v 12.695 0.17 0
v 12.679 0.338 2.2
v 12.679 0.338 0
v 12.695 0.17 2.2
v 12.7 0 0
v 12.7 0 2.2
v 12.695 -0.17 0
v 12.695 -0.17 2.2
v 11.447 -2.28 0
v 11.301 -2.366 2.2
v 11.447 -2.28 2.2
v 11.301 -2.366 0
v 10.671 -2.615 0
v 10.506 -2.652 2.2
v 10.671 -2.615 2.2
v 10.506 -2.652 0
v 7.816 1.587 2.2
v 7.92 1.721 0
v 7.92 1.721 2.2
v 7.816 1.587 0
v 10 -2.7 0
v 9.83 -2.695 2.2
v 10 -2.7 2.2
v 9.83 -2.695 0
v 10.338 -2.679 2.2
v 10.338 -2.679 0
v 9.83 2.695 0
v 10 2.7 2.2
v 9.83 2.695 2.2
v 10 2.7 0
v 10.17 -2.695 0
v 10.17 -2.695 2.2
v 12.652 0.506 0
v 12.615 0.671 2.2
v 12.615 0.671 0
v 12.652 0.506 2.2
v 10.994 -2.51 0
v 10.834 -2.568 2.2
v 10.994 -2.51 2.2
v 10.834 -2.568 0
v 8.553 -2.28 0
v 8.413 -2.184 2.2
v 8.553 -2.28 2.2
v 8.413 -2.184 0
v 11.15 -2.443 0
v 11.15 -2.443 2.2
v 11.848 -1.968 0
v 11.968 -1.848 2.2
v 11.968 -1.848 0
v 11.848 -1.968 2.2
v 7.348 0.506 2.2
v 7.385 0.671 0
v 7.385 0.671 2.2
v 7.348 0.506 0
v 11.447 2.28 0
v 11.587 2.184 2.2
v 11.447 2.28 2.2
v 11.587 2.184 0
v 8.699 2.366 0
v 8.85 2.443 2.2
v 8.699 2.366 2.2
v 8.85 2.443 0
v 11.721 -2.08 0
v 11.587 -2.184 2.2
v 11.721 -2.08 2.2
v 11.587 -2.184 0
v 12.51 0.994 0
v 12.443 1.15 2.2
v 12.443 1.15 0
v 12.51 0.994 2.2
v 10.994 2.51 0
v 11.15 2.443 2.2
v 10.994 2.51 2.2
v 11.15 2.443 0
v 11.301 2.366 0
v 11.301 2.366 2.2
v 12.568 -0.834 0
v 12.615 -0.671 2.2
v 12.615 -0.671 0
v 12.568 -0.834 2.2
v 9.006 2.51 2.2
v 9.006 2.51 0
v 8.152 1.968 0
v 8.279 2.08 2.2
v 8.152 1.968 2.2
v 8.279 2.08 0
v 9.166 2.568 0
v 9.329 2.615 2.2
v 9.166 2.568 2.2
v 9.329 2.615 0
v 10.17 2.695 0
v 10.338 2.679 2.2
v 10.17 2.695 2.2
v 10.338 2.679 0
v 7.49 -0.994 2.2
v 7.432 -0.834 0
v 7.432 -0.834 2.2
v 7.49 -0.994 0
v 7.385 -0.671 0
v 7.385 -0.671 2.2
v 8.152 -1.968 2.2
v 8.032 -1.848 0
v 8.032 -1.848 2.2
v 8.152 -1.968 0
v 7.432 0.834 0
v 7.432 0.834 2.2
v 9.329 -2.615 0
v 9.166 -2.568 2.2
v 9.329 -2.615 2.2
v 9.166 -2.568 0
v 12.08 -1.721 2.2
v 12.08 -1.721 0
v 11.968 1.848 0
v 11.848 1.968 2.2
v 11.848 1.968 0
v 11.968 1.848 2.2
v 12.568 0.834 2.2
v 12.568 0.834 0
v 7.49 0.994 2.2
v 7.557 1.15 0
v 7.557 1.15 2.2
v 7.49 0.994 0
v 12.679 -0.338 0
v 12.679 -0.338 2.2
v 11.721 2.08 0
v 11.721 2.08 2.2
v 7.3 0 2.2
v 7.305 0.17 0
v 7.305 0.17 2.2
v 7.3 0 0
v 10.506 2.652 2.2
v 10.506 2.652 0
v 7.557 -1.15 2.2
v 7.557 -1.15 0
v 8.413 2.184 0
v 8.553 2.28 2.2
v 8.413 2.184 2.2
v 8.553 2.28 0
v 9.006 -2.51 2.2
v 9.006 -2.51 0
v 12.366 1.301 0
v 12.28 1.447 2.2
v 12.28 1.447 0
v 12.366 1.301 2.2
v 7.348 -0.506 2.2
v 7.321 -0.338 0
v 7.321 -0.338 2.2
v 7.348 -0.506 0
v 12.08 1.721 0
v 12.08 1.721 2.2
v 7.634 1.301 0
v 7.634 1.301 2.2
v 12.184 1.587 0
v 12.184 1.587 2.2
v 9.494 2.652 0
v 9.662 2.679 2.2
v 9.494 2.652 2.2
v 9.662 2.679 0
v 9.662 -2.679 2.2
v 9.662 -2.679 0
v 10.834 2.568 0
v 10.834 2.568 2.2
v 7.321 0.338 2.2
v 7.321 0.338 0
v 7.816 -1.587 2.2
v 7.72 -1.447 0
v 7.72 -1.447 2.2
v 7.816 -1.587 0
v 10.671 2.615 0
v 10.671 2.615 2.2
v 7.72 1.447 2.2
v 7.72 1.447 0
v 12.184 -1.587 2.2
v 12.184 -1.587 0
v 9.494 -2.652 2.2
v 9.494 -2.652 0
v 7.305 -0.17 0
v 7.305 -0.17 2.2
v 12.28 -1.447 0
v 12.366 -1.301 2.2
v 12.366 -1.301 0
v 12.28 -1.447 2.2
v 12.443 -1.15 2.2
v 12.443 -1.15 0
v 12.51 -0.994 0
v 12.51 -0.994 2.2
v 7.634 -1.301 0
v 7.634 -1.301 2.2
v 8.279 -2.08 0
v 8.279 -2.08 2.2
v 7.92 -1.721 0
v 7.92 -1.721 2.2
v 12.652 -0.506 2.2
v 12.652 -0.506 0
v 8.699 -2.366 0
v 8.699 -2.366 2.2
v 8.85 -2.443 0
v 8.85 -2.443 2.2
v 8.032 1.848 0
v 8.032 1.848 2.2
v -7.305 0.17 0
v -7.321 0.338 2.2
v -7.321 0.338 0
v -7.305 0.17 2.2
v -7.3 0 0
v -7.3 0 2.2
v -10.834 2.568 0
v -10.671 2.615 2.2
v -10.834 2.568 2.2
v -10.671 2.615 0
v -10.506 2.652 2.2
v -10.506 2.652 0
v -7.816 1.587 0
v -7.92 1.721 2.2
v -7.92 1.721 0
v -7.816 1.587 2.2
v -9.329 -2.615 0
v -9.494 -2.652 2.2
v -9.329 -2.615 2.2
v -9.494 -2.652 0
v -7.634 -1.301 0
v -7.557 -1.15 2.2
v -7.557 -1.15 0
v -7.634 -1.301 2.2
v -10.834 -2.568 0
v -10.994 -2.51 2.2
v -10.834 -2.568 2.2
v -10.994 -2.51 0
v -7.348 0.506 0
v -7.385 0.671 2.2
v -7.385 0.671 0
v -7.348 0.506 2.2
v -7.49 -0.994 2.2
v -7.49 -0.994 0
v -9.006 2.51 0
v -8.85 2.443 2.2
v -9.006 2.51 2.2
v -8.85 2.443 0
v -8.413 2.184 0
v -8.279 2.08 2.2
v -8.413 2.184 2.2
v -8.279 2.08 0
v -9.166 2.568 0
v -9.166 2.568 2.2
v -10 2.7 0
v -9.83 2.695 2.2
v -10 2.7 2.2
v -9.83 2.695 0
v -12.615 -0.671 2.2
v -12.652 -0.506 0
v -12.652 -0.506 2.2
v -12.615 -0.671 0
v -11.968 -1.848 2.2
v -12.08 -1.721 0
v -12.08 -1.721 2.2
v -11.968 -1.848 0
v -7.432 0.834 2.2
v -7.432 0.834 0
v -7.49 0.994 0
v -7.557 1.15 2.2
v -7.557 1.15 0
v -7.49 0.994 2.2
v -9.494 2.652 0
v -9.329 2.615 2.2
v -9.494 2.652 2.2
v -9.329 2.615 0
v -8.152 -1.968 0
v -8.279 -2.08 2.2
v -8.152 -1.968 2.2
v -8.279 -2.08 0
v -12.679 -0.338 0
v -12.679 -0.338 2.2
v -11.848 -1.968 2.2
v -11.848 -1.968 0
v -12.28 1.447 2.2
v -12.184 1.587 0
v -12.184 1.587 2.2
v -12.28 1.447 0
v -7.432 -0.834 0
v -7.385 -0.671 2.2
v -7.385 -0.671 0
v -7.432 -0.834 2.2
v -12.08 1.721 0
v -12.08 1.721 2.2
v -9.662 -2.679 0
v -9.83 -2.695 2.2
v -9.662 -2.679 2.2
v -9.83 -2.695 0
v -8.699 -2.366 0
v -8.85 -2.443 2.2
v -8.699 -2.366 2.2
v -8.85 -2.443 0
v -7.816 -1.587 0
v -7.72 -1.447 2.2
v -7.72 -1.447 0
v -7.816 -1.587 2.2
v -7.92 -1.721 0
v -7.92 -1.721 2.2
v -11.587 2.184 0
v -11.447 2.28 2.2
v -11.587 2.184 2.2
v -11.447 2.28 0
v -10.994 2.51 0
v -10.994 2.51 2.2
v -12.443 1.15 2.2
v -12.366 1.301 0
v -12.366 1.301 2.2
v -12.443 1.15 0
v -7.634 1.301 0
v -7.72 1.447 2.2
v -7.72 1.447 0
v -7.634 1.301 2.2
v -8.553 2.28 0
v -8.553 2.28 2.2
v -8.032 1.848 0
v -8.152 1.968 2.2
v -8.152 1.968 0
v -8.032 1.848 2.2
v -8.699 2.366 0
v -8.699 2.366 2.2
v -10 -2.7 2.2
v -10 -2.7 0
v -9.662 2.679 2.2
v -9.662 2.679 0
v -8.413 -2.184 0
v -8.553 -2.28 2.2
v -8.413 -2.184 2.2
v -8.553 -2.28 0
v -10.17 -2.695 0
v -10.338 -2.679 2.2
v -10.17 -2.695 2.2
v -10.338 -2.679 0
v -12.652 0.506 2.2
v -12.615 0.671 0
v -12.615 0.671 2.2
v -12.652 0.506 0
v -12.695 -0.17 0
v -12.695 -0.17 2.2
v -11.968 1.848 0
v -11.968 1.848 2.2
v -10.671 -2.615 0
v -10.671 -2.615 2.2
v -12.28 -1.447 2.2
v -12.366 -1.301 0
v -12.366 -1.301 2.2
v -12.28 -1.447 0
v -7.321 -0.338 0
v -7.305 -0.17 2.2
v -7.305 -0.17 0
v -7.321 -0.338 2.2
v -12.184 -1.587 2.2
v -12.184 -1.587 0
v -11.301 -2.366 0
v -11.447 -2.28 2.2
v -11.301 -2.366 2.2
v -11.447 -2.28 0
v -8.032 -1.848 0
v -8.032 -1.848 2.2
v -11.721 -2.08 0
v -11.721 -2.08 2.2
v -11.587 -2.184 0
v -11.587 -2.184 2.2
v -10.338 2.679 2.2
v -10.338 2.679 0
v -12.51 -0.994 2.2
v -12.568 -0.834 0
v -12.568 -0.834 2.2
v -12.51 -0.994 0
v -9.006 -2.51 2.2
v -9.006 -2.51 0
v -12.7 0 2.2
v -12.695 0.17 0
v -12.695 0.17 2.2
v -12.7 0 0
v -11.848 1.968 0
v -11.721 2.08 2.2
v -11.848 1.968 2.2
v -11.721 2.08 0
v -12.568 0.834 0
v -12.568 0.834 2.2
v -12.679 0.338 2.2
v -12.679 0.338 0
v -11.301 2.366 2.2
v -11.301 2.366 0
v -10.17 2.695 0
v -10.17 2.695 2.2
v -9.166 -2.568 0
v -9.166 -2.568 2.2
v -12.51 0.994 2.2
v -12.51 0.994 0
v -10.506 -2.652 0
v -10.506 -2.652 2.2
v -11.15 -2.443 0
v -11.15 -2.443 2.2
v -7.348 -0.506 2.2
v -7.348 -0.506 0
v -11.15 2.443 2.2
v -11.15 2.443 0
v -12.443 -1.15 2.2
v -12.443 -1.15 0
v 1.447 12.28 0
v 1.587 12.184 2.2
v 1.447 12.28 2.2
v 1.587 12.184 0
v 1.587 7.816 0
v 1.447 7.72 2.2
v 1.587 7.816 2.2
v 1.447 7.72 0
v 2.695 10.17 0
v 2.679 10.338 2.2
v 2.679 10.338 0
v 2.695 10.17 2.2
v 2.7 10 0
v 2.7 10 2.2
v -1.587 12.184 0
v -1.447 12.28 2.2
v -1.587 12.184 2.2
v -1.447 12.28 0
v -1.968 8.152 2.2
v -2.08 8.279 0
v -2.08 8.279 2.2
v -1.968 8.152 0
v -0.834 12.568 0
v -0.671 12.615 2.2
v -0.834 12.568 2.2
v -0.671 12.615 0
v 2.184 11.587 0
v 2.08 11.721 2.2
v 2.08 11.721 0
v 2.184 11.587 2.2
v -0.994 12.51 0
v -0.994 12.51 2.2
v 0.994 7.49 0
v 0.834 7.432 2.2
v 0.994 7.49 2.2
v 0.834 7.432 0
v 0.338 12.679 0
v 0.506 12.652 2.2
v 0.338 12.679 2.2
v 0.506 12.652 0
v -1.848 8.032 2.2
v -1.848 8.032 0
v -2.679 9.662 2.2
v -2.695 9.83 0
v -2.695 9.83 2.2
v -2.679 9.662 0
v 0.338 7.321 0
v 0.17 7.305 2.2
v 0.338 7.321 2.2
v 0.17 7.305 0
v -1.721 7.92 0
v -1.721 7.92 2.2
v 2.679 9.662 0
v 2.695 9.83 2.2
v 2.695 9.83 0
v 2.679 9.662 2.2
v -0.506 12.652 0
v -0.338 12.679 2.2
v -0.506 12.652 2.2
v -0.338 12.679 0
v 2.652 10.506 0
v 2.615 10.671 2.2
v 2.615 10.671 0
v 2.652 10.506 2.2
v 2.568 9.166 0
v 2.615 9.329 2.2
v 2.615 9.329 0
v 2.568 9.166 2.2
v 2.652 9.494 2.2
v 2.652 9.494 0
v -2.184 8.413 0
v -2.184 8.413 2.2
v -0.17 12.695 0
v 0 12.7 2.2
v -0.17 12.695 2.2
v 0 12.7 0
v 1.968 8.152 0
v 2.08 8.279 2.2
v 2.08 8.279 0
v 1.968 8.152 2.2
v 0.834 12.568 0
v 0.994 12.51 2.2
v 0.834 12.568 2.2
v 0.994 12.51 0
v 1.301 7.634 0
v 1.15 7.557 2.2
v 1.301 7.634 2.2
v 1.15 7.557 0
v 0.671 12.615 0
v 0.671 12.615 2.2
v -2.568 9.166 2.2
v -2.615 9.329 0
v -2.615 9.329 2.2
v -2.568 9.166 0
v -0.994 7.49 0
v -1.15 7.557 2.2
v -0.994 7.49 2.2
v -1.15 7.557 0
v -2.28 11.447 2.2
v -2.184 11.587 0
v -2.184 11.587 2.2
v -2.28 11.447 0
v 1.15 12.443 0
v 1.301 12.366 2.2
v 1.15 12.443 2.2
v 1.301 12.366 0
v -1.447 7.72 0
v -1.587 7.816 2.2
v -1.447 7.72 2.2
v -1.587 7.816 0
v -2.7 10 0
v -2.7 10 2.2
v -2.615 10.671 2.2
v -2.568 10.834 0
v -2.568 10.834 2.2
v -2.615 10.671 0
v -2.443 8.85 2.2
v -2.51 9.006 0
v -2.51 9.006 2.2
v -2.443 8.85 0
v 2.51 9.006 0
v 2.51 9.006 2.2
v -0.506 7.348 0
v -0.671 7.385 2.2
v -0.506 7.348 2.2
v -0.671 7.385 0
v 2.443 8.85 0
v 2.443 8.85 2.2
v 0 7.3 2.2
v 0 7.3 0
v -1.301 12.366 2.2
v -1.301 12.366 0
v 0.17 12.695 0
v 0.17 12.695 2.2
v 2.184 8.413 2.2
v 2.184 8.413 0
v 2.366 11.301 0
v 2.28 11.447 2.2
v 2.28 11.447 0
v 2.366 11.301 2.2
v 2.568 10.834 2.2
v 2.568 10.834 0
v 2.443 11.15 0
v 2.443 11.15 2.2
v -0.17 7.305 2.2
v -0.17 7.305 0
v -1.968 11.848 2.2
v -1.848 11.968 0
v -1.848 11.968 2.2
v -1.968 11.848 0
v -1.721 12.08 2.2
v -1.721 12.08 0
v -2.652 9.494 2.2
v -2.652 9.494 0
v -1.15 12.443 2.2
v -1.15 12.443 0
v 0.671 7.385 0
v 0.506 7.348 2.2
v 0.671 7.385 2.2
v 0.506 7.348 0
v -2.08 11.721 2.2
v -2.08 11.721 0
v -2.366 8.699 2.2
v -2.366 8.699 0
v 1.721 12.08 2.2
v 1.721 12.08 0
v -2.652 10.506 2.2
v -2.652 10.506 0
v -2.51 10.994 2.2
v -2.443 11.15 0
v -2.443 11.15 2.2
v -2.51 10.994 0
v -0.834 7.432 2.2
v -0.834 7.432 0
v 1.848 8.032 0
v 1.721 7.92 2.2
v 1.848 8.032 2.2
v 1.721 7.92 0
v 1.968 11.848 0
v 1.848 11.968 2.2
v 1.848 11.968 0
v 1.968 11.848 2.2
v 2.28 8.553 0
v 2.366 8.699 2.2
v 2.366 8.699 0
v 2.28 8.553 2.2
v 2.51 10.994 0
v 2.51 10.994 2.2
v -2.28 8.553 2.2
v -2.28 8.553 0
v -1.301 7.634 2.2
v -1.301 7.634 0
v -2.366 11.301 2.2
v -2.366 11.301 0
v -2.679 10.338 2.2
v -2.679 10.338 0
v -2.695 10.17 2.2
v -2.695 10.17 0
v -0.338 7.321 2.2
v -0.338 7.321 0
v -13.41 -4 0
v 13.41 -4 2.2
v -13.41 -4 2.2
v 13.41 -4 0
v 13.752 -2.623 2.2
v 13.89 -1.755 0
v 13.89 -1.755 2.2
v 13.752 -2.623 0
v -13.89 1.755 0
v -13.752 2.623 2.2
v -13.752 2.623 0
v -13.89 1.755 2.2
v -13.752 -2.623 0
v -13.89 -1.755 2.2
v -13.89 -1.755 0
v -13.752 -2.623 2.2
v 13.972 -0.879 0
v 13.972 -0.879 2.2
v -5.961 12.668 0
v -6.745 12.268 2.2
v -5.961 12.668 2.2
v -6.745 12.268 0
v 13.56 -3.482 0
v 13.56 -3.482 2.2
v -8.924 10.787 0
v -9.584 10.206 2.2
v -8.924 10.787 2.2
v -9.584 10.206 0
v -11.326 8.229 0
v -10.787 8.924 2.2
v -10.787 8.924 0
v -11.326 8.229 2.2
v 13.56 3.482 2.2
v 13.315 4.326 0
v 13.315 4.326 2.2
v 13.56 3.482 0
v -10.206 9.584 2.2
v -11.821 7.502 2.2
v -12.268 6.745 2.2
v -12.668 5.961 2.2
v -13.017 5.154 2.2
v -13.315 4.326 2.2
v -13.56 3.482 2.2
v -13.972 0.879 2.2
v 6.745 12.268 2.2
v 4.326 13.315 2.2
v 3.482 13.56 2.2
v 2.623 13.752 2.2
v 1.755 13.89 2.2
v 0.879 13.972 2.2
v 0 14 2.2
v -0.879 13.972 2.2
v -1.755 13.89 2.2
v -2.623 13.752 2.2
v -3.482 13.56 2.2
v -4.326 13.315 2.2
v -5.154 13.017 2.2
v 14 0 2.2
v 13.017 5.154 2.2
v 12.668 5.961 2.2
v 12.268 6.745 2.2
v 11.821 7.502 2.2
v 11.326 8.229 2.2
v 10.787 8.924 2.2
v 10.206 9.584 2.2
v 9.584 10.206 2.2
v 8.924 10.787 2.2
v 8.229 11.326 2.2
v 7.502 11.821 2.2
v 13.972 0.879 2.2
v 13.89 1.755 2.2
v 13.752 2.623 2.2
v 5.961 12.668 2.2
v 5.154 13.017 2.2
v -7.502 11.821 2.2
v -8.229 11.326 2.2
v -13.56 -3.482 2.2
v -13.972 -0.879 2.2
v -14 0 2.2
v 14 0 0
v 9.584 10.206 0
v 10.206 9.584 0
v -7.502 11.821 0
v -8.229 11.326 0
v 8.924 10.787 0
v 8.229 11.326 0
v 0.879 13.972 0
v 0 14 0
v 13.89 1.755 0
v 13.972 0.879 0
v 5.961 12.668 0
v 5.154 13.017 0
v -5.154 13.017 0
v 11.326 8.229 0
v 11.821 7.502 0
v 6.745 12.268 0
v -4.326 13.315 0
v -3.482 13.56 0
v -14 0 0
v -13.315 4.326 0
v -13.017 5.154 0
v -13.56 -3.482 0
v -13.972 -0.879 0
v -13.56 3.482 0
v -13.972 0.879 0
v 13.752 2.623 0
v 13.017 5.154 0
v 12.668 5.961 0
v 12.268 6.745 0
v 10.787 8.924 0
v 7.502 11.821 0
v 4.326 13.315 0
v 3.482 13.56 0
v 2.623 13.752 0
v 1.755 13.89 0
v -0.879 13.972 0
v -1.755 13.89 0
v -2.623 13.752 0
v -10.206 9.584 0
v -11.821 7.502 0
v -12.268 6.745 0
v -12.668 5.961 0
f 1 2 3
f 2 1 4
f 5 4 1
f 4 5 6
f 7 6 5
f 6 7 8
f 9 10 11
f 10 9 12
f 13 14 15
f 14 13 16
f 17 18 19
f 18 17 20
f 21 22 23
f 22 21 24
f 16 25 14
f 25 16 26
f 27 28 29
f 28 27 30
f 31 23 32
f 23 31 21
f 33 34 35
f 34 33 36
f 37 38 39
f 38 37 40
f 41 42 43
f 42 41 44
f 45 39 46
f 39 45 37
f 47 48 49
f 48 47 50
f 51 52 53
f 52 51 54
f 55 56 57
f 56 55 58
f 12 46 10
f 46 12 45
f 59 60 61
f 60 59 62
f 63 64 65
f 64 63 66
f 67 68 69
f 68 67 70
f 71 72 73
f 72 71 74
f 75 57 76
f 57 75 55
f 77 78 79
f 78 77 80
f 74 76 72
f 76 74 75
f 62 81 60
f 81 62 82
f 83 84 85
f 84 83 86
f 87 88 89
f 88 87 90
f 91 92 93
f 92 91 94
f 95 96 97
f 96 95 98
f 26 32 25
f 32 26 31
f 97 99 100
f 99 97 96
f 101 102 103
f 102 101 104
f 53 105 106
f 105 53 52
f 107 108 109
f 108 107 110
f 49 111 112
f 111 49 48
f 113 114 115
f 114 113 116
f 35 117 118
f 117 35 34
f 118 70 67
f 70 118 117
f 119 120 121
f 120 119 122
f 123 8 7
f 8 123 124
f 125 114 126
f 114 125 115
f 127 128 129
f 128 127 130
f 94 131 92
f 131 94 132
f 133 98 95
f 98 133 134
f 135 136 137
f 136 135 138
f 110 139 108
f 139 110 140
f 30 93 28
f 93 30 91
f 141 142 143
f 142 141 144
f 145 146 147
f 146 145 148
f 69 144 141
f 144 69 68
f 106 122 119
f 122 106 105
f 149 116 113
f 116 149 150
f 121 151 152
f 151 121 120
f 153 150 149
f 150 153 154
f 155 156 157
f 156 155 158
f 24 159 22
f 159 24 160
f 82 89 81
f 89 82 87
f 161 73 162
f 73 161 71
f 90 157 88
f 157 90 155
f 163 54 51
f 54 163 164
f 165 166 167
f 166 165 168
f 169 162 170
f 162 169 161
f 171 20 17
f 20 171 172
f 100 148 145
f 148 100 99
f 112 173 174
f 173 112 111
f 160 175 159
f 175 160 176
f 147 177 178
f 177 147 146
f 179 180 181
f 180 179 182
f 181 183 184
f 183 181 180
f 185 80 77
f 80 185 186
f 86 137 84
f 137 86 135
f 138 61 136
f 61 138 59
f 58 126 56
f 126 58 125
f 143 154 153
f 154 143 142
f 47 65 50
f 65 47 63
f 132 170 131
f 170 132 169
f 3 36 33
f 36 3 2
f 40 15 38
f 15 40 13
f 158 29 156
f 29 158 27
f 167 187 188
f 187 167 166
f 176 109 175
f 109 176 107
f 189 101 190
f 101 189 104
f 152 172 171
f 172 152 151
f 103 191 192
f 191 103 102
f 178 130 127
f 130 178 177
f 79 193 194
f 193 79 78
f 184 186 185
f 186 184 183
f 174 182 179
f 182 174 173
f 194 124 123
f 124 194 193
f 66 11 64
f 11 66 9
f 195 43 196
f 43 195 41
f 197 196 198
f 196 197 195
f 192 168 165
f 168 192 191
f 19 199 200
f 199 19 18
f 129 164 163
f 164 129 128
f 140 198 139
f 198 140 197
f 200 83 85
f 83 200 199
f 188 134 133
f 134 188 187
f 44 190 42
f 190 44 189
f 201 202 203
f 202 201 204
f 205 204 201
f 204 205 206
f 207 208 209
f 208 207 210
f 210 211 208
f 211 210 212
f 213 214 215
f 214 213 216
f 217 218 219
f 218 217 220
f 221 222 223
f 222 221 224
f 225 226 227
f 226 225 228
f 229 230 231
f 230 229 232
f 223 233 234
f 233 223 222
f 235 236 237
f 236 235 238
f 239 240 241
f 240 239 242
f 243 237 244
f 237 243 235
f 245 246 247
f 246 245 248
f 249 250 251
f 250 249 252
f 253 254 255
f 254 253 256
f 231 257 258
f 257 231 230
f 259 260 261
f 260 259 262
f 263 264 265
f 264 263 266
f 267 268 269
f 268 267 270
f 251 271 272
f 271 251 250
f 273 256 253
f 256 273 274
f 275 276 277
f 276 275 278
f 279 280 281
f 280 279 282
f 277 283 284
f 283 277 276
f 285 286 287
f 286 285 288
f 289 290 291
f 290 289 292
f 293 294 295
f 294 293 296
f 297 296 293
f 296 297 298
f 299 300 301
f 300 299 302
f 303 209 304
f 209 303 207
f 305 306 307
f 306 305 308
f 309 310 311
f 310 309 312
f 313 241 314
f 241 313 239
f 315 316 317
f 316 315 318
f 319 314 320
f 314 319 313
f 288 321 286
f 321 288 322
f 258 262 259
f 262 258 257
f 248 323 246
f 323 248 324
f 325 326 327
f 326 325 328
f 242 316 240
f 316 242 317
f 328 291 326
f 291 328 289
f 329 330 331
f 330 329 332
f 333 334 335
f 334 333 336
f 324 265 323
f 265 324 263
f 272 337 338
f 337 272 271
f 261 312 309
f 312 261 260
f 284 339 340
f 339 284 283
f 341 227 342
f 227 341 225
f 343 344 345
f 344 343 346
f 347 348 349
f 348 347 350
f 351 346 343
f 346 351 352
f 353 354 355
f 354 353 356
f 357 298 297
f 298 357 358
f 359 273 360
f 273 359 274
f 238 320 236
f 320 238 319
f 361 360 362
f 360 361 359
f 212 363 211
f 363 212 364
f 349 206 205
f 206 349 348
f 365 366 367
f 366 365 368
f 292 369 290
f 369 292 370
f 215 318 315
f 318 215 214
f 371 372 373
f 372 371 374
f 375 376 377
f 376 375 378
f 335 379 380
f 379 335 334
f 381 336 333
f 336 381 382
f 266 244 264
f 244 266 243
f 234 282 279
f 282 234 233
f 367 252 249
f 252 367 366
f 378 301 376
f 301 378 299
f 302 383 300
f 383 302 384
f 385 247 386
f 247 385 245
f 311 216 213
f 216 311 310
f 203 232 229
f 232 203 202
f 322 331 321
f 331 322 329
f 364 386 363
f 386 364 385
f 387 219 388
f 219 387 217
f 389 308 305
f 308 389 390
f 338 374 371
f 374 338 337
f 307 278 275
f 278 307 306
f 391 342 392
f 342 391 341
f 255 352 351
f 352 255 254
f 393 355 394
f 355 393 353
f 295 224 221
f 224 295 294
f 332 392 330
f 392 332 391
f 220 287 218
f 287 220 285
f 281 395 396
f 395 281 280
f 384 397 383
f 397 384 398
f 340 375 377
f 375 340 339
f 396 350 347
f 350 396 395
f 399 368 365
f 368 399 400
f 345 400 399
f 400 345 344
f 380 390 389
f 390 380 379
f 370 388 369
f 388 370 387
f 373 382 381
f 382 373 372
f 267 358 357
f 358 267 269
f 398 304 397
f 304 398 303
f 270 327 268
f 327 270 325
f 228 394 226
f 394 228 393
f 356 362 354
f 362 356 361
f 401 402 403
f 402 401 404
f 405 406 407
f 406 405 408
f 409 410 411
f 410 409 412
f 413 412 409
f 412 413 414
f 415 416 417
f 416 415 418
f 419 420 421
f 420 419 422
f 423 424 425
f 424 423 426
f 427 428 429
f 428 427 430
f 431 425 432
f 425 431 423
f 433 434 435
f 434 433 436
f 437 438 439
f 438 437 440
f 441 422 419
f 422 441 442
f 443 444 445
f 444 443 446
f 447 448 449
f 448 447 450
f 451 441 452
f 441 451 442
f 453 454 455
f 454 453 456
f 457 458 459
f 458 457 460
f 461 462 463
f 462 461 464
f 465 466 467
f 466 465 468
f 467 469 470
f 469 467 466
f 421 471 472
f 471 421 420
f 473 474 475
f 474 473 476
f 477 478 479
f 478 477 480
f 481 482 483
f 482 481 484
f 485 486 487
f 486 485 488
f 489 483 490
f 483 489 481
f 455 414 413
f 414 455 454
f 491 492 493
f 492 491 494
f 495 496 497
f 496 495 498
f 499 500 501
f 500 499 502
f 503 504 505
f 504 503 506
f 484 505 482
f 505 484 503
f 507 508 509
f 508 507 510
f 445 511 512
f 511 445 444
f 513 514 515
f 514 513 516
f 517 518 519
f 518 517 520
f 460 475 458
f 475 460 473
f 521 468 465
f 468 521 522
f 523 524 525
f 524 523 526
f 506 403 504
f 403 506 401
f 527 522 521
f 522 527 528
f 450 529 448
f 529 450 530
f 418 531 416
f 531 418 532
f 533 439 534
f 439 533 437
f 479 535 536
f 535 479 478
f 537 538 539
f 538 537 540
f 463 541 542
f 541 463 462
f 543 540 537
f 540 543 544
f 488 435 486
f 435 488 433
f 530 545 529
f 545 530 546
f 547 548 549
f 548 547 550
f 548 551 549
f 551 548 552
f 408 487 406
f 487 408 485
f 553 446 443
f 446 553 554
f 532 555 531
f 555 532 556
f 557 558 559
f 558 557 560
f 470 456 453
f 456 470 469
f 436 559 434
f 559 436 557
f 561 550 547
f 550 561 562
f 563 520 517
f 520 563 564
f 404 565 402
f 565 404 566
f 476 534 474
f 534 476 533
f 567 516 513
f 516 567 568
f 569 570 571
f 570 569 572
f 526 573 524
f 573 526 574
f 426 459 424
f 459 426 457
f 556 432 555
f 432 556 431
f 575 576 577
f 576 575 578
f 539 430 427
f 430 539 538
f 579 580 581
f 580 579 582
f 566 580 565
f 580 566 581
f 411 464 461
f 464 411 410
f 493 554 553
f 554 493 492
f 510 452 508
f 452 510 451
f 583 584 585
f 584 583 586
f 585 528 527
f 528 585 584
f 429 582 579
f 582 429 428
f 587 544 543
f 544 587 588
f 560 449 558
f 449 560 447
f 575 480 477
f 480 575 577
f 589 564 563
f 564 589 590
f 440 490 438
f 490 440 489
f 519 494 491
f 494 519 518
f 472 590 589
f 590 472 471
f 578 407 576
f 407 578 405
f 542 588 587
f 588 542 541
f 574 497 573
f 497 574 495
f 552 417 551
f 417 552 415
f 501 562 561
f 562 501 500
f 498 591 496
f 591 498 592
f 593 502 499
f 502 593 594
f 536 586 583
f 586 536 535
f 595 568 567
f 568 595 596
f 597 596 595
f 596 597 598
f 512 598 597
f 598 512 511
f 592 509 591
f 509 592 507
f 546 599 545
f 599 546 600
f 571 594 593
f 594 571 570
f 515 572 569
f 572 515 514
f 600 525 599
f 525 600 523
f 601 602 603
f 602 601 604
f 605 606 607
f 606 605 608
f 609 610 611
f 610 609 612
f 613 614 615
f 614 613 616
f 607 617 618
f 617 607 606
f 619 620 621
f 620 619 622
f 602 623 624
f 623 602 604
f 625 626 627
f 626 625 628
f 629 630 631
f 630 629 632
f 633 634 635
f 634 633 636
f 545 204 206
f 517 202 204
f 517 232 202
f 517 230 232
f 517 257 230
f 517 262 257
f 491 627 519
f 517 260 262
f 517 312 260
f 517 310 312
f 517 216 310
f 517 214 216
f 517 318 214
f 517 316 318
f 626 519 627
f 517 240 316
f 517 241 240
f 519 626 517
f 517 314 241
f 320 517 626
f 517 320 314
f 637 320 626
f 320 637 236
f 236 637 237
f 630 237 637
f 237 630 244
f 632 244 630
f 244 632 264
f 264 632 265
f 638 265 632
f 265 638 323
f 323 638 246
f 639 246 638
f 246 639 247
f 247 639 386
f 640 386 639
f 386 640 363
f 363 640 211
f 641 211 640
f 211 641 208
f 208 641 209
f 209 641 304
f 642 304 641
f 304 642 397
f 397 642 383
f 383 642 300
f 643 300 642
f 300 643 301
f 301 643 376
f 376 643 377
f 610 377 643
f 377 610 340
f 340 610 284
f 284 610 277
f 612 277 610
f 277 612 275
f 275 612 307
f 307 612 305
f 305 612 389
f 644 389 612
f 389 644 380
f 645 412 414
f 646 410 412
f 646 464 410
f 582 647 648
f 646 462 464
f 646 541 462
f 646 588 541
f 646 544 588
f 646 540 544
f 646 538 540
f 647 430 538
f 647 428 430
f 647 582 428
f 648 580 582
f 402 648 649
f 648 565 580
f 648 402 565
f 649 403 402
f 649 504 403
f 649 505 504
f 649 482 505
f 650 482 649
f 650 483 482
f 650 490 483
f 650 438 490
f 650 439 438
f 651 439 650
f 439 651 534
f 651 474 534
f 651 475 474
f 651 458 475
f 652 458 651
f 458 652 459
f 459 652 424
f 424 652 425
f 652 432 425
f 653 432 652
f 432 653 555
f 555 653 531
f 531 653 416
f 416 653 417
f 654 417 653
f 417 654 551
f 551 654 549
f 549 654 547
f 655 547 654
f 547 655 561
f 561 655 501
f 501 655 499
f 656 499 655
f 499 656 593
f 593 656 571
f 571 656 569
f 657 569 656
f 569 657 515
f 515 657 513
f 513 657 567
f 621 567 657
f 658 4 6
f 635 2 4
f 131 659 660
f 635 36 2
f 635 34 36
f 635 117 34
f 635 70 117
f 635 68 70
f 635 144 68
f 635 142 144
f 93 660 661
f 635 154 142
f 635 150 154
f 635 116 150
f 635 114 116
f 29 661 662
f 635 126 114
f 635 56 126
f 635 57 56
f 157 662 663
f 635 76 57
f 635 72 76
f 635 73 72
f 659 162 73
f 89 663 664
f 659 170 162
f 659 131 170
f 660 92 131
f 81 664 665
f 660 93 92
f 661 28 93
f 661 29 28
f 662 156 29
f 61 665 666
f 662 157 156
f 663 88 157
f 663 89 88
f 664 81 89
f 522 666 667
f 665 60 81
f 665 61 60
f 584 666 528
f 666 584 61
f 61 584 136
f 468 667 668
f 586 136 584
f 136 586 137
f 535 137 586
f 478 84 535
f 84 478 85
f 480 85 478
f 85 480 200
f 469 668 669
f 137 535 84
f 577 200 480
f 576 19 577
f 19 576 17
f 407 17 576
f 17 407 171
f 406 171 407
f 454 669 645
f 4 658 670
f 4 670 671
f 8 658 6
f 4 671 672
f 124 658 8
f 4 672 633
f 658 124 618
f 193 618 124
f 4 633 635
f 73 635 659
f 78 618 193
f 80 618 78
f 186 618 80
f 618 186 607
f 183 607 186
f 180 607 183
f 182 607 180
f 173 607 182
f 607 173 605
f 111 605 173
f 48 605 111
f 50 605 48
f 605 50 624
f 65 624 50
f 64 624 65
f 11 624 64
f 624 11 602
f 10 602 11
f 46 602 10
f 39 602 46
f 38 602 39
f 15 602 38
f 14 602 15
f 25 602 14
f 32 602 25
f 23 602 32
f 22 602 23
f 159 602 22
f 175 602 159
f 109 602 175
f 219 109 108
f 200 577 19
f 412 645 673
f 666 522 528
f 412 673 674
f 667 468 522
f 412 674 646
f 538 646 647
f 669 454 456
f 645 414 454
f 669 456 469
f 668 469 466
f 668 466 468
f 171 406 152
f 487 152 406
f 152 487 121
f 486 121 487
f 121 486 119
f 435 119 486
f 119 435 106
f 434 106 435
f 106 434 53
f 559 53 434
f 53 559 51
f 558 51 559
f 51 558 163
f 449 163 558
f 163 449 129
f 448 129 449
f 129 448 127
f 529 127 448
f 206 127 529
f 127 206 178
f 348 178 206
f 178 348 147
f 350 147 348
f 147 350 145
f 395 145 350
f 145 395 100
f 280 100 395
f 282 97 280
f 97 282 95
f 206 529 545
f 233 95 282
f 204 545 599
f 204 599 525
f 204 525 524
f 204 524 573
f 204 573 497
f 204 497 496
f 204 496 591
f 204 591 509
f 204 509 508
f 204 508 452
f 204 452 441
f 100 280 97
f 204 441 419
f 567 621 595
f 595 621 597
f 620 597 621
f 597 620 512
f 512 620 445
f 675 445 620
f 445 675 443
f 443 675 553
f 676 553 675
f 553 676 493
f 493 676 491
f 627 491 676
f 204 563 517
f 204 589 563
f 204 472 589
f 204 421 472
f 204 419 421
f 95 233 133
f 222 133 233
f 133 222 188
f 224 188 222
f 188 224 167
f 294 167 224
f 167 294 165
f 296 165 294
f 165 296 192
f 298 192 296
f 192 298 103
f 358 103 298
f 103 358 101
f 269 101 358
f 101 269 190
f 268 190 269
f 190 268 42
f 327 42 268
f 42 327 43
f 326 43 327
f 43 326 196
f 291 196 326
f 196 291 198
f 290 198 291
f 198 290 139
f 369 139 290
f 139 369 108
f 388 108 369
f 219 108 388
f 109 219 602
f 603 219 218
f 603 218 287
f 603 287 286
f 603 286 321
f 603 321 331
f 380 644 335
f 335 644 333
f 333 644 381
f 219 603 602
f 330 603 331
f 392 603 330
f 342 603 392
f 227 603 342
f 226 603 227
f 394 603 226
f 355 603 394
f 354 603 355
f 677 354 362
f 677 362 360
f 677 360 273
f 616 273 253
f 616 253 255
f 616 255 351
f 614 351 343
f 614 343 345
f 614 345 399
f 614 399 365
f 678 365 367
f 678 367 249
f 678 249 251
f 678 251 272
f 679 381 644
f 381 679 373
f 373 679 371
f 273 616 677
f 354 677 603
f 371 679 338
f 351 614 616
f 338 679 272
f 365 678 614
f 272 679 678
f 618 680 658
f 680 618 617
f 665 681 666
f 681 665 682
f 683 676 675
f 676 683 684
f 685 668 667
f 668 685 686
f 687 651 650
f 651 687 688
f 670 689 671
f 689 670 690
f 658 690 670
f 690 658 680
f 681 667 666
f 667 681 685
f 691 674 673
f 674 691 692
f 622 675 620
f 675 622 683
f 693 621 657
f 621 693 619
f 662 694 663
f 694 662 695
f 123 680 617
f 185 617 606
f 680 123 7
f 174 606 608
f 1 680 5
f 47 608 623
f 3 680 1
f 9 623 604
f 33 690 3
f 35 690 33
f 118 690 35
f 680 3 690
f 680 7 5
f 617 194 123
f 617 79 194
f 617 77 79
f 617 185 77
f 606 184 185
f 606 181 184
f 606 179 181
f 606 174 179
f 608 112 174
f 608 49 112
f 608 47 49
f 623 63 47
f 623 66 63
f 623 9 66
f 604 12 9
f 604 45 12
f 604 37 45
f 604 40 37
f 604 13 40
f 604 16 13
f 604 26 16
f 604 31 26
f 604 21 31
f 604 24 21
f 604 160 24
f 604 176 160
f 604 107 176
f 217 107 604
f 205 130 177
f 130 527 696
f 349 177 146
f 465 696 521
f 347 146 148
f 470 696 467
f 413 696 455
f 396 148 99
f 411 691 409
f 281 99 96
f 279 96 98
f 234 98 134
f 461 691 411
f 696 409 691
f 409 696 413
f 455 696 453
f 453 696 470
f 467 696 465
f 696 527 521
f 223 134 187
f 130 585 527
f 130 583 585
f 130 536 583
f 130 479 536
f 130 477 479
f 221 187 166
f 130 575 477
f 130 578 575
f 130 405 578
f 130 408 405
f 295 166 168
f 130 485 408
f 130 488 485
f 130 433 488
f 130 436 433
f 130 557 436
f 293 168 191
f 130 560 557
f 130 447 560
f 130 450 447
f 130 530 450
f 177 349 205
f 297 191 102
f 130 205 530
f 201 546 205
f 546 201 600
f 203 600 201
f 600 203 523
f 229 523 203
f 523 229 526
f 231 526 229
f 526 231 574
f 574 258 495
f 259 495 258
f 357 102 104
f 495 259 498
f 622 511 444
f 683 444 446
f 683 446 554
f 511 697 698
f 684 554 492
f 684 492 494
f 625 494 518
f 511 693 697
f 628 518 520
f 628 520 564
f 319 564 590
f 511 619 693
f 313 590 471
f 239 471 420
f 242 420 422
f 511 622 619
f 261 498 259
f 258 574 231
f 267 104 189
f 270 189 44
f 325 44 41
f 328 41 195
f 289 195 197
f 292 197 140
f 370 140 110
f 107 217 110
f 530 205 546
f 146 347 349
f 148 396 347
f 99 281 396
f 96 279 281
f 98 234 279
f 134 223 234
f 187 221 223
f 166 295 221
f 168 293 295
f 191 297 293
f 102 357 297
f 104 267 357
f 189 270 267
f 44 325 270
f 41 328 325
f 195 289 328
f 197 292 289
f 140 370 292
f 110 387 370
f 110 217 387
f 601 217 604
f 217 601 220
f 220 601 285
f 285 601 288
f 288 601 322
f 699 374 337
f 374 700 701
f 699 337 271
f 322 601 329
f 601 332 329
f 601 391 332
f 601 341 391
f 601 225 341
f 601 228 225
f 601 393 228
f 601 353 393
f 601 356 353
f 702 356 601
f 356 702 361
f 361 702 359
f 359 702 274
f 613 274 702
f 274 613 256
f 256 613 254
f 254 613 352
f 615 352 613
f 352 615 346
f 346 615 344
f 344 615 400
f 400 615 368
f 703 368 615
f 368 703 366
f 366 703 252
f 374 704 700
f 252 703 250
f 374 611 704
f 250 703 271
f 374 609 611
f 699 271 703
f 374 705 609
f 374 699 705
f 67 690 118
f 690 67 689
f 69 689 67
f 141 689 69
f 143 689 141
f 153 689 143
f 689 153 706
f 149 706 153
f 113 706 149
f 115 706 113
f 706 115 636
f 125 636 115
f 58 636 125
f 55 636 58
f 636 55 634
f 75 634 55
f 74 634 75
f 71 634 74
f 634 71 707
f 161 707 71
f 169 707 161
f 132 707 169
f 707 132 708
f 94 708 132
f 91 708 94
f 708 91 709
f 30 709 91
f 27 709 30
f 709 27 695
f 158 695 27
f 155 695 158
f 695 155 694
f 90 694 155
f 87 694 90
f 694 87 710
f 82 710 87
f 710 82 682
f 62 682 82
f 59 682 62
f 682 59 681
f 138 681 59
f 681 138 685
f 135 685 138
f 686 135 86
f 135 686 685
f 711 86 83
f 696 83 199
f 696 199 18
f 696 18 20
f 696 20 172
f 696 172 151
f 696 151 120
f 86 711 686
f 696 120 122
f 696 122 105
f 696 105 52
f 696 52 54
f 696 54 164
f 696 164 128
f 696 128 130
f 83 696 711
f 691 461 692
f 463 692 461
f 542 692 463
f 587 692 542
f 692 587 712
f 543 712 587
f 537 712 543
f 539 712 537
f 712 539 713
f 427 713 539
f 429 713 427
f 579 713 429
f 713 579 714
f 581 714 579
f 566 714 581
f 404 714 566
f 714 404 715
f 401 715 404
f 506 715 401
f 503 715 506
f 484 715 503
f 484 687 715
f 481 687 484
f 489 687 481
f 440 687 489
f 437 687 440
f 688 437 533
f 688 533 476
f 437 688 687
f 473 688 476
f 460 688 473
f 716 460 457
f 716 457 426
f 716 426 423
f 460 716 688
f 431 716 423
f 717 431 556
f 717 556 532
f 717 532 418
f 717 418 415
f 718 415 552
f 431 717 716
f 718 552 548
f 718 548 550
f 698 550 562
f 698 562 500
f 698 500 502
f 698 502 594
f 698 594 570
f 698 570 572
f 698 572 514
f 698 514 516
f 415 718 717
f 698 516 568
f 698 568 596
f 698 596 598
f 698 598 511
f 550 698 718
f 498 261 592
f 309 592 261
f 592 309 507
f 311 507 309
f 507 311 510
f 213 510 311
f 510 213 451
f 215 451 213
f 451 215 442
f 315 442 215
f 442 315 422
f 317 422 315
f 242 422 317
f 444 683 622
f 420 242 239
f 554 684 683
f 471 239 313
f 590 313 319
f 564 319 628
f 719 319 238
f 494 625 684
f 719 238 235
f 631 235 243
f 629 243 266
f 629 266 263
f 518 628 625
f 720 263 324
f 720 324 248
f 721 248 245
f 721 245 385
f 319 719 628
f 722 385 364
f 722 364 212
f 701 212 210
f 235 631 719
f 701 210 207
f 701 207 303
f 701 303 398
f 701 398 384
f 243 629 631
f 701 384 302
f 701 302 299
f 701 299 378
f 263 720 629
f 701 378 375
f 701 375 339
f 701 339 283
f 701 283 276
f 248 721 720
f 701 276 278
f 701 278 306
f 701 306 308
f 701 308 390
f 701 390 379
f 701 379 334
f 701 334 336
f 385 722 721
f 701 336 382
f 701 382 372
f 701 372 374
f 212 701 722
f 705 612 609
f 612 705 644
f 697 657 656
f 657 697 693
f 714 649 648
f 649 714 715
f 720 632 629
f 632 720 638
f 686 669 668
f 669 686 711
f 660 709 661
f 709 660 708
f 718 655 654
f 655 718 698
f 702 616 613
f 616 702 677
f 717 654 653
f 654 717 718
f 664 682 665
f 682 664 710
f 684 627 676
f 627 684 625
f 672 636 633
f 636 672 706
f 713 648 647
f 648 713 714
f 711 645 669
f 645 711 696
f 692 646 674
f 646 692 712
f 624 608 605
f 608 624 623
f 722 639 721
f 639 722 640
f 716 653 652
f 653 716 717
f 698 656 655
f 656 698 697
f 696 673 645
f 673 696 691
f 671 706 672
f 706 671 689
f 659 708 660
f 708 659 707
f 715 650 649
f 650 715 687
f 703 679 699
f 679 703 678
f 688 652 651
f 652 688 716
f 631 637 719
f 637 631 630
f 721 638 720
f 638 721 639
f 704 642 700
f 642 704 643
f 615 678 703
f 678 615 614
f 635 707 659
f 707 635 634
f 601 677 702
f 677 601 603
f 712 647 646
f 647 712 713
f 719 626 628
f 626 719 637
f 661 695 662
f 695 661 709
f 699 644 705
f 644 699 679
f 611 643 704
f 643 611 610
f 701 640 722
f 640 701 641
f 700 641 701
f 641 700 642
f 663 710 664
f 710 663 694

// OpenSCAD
difference(){
	union(){ 

        difference(){
            union(){ 

                translate([0, 0,0]){
                       cylinder(h=2.2, r=14 , $fn=100, center=false);
                }                              

            }
            union() {
                translate([0+10,0,-0.1]){
                    rotate([0,0,0]){
                        cylinder(h=500, r=2.7, $fn=100, center=false);
                    }   
                }
                translate([0-10,0,-0.1]){
                    rotate([0,0,0]){
                        cylinder(h=500, r=2.7, $fn=100, center=false);
                    }   
                }
                translate([0,10,-0.1]){
                    rotate([0,0,0]){
                        cylinder(h=500, r=2.7, $fn=100, center=false);
                    }   
                }
               translate([-15,-20,-1]){
                    cube([30,16,6], center=false);
                }        
            }
         }

	}
	union() {
    }
}


 
